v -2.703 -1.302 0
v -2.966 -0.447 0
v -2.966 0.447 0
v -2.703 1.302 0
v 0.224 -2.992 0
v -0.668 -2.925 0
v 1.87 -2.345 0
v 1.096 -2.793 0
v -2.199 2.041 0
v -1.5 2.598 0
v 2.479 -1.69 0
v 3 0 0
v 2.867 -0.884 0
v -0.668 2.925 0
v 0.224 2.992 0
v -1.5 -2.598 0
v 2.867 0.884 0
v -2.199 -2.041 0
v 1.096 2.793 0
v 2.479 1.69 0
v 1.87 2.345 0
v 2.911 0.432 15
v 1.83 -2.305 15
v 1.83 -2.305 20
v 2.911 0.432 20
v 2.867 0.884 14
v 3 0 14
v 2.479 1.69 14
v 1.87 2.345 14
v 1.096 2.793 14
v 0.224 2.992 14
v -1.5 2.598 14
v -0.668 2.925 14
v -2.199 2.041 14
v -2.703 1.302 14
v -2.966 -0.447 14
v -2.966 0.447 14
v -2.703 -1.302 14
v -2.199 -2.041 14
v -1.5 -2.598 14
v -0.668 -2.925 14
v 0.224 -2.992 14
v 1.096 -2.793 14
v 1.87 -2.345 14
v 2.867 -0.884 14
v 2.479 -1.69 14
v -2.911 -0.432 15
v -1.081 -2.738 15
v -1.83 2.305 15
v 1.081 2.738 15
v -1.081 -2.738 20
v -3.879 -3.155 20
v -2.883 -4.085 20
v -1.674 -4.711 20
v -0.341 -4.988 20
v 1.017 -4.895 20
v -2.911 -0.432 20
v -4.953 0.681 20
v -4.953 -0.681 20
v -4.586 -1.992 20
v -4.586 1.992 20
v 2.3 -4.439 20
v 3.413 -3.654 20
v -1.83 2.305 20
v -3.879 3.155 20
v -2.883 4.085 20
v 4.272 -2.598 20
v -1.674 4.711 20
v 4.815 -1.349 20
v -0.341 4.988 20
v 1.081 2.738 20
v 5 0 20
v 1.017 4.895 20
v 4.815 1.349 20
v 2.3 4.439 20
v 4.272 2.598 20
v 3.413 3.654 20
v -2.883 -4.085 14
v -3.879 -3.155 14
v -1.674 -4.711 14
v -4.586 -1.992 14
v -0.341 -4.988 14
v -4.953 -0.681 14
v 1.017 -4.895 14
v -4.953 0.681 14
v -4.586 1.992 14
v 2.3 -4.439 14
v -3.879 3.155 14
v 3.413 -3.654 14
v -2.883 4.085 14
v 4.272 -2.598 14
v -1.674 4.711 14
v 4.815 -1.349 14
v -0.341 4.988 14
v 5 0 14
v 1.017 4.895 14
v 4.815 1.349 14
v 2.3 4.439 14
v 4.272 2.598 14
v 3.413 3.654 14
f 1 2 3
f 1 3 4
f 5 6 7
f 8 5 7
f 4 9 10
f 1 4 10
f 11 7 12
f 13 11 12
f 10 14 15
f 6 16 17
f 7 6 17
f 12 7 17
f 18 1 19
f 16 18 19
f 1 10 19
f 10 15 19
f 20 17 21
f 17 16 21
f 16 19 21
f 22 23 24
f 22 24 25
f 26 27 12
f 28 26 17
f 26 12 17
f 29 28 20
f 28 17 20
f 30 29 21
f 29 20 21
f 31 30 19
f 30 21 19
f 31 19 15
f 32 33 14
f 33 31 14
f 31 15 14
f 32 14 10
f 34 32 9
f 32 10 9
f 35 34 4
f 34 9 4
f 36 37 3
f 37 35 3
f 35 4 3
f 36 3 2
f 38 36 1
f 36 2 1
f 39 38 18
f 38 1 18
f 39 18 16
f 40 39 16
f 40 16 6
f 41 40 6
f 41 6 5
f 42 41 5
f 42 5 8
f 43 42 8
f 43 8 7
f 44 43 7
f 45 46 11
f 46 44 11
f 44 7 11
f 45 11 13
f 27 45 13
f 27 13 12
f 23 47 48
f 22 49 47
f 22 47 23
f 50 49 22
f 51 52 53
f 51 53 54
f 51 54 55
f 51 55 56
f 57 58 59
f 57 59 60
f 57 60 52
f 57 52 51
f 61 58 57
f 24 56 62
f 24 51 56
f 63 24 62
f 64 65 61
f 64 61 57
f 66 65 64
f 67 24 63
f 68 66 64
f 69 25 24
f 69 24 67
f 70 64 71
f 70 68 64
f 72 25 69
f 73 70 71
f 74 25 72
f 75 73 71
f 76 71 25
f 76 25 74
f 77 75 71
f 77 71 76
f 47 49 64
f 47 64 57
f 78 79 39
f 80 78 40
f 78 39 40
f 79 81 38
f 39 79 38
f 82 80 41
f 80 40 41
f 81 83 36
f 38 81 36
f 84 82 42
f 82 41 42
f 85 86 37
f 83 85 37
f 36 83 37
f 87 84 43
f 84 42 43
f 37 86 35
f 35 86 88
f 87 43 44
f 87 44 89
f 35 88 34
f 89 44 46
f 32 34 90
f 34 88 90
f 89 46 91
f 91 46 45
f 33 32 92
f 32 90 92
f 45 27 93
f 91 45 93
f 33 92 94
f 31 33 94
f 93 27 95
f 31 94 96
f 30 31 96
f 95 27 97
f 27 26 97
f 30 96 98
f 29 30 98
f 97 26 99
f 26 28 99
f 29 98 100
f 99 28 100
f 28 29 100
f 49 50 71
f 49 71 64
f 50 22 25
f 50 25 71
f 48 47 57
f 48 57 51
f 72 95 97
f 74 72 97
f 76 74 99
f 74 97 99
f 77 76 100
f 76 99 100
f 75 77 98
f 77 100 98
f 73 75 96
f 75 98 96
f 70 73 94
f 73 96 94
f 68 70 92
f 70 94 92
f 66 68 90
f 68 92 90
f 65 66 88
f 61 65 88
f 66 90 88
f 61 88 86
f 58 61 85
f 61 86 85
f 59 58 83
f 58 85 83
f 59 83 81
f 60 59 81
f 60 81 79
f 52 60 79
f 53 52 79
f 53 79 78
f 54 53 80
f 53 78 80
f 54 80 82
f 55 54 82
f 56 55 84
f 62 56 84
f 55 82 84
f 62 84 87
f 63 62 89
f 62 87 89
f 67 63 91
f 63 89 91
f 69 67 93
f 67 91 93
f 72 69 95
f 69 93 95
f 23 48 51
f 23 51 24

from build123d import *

# Parameters (mm, degrees)
SKETCH_1_R           = 3
EXTRUDE_1_DEPTH      = 15
EXTRUDE_2_DEPTH      = 5
EXTRUDE_2_DEPTH_BACK = 1
SKETCH_2_R           = 5


with BuildPart() as part:
    # 草图1 → 拉伸1 (new body)
    with BuildSketch(Plane.XY):
        Circle(SKETCH_1_R)
    extrude(amount=EXTRUDE_1_DEPTH)

    # 草图2 → 拉伸2 (add, two sides: drawn at the far end of the back side and taken through both)
    with BuildSketch(Plane.XY.offset(15).offset(-EXTRUDE_2_DEPTH_BACK)):
        Circle(SKETCH_2_R)
        Polygon((-1.830187787, 2.305076164), (-2.911348409, -0.432451036), (-1.081160622, -2.7375272), (1.830187787, -2.305076164), (2.911348409, 0.432451036), (1.081160622, 2.7375272), align=None, mode=Mode.SUBTRACT)
    extrude(amount=EXTRUDE_2_DEPTH + EXTRUDE_2_DEPTH_BACK)


solid = part.part
